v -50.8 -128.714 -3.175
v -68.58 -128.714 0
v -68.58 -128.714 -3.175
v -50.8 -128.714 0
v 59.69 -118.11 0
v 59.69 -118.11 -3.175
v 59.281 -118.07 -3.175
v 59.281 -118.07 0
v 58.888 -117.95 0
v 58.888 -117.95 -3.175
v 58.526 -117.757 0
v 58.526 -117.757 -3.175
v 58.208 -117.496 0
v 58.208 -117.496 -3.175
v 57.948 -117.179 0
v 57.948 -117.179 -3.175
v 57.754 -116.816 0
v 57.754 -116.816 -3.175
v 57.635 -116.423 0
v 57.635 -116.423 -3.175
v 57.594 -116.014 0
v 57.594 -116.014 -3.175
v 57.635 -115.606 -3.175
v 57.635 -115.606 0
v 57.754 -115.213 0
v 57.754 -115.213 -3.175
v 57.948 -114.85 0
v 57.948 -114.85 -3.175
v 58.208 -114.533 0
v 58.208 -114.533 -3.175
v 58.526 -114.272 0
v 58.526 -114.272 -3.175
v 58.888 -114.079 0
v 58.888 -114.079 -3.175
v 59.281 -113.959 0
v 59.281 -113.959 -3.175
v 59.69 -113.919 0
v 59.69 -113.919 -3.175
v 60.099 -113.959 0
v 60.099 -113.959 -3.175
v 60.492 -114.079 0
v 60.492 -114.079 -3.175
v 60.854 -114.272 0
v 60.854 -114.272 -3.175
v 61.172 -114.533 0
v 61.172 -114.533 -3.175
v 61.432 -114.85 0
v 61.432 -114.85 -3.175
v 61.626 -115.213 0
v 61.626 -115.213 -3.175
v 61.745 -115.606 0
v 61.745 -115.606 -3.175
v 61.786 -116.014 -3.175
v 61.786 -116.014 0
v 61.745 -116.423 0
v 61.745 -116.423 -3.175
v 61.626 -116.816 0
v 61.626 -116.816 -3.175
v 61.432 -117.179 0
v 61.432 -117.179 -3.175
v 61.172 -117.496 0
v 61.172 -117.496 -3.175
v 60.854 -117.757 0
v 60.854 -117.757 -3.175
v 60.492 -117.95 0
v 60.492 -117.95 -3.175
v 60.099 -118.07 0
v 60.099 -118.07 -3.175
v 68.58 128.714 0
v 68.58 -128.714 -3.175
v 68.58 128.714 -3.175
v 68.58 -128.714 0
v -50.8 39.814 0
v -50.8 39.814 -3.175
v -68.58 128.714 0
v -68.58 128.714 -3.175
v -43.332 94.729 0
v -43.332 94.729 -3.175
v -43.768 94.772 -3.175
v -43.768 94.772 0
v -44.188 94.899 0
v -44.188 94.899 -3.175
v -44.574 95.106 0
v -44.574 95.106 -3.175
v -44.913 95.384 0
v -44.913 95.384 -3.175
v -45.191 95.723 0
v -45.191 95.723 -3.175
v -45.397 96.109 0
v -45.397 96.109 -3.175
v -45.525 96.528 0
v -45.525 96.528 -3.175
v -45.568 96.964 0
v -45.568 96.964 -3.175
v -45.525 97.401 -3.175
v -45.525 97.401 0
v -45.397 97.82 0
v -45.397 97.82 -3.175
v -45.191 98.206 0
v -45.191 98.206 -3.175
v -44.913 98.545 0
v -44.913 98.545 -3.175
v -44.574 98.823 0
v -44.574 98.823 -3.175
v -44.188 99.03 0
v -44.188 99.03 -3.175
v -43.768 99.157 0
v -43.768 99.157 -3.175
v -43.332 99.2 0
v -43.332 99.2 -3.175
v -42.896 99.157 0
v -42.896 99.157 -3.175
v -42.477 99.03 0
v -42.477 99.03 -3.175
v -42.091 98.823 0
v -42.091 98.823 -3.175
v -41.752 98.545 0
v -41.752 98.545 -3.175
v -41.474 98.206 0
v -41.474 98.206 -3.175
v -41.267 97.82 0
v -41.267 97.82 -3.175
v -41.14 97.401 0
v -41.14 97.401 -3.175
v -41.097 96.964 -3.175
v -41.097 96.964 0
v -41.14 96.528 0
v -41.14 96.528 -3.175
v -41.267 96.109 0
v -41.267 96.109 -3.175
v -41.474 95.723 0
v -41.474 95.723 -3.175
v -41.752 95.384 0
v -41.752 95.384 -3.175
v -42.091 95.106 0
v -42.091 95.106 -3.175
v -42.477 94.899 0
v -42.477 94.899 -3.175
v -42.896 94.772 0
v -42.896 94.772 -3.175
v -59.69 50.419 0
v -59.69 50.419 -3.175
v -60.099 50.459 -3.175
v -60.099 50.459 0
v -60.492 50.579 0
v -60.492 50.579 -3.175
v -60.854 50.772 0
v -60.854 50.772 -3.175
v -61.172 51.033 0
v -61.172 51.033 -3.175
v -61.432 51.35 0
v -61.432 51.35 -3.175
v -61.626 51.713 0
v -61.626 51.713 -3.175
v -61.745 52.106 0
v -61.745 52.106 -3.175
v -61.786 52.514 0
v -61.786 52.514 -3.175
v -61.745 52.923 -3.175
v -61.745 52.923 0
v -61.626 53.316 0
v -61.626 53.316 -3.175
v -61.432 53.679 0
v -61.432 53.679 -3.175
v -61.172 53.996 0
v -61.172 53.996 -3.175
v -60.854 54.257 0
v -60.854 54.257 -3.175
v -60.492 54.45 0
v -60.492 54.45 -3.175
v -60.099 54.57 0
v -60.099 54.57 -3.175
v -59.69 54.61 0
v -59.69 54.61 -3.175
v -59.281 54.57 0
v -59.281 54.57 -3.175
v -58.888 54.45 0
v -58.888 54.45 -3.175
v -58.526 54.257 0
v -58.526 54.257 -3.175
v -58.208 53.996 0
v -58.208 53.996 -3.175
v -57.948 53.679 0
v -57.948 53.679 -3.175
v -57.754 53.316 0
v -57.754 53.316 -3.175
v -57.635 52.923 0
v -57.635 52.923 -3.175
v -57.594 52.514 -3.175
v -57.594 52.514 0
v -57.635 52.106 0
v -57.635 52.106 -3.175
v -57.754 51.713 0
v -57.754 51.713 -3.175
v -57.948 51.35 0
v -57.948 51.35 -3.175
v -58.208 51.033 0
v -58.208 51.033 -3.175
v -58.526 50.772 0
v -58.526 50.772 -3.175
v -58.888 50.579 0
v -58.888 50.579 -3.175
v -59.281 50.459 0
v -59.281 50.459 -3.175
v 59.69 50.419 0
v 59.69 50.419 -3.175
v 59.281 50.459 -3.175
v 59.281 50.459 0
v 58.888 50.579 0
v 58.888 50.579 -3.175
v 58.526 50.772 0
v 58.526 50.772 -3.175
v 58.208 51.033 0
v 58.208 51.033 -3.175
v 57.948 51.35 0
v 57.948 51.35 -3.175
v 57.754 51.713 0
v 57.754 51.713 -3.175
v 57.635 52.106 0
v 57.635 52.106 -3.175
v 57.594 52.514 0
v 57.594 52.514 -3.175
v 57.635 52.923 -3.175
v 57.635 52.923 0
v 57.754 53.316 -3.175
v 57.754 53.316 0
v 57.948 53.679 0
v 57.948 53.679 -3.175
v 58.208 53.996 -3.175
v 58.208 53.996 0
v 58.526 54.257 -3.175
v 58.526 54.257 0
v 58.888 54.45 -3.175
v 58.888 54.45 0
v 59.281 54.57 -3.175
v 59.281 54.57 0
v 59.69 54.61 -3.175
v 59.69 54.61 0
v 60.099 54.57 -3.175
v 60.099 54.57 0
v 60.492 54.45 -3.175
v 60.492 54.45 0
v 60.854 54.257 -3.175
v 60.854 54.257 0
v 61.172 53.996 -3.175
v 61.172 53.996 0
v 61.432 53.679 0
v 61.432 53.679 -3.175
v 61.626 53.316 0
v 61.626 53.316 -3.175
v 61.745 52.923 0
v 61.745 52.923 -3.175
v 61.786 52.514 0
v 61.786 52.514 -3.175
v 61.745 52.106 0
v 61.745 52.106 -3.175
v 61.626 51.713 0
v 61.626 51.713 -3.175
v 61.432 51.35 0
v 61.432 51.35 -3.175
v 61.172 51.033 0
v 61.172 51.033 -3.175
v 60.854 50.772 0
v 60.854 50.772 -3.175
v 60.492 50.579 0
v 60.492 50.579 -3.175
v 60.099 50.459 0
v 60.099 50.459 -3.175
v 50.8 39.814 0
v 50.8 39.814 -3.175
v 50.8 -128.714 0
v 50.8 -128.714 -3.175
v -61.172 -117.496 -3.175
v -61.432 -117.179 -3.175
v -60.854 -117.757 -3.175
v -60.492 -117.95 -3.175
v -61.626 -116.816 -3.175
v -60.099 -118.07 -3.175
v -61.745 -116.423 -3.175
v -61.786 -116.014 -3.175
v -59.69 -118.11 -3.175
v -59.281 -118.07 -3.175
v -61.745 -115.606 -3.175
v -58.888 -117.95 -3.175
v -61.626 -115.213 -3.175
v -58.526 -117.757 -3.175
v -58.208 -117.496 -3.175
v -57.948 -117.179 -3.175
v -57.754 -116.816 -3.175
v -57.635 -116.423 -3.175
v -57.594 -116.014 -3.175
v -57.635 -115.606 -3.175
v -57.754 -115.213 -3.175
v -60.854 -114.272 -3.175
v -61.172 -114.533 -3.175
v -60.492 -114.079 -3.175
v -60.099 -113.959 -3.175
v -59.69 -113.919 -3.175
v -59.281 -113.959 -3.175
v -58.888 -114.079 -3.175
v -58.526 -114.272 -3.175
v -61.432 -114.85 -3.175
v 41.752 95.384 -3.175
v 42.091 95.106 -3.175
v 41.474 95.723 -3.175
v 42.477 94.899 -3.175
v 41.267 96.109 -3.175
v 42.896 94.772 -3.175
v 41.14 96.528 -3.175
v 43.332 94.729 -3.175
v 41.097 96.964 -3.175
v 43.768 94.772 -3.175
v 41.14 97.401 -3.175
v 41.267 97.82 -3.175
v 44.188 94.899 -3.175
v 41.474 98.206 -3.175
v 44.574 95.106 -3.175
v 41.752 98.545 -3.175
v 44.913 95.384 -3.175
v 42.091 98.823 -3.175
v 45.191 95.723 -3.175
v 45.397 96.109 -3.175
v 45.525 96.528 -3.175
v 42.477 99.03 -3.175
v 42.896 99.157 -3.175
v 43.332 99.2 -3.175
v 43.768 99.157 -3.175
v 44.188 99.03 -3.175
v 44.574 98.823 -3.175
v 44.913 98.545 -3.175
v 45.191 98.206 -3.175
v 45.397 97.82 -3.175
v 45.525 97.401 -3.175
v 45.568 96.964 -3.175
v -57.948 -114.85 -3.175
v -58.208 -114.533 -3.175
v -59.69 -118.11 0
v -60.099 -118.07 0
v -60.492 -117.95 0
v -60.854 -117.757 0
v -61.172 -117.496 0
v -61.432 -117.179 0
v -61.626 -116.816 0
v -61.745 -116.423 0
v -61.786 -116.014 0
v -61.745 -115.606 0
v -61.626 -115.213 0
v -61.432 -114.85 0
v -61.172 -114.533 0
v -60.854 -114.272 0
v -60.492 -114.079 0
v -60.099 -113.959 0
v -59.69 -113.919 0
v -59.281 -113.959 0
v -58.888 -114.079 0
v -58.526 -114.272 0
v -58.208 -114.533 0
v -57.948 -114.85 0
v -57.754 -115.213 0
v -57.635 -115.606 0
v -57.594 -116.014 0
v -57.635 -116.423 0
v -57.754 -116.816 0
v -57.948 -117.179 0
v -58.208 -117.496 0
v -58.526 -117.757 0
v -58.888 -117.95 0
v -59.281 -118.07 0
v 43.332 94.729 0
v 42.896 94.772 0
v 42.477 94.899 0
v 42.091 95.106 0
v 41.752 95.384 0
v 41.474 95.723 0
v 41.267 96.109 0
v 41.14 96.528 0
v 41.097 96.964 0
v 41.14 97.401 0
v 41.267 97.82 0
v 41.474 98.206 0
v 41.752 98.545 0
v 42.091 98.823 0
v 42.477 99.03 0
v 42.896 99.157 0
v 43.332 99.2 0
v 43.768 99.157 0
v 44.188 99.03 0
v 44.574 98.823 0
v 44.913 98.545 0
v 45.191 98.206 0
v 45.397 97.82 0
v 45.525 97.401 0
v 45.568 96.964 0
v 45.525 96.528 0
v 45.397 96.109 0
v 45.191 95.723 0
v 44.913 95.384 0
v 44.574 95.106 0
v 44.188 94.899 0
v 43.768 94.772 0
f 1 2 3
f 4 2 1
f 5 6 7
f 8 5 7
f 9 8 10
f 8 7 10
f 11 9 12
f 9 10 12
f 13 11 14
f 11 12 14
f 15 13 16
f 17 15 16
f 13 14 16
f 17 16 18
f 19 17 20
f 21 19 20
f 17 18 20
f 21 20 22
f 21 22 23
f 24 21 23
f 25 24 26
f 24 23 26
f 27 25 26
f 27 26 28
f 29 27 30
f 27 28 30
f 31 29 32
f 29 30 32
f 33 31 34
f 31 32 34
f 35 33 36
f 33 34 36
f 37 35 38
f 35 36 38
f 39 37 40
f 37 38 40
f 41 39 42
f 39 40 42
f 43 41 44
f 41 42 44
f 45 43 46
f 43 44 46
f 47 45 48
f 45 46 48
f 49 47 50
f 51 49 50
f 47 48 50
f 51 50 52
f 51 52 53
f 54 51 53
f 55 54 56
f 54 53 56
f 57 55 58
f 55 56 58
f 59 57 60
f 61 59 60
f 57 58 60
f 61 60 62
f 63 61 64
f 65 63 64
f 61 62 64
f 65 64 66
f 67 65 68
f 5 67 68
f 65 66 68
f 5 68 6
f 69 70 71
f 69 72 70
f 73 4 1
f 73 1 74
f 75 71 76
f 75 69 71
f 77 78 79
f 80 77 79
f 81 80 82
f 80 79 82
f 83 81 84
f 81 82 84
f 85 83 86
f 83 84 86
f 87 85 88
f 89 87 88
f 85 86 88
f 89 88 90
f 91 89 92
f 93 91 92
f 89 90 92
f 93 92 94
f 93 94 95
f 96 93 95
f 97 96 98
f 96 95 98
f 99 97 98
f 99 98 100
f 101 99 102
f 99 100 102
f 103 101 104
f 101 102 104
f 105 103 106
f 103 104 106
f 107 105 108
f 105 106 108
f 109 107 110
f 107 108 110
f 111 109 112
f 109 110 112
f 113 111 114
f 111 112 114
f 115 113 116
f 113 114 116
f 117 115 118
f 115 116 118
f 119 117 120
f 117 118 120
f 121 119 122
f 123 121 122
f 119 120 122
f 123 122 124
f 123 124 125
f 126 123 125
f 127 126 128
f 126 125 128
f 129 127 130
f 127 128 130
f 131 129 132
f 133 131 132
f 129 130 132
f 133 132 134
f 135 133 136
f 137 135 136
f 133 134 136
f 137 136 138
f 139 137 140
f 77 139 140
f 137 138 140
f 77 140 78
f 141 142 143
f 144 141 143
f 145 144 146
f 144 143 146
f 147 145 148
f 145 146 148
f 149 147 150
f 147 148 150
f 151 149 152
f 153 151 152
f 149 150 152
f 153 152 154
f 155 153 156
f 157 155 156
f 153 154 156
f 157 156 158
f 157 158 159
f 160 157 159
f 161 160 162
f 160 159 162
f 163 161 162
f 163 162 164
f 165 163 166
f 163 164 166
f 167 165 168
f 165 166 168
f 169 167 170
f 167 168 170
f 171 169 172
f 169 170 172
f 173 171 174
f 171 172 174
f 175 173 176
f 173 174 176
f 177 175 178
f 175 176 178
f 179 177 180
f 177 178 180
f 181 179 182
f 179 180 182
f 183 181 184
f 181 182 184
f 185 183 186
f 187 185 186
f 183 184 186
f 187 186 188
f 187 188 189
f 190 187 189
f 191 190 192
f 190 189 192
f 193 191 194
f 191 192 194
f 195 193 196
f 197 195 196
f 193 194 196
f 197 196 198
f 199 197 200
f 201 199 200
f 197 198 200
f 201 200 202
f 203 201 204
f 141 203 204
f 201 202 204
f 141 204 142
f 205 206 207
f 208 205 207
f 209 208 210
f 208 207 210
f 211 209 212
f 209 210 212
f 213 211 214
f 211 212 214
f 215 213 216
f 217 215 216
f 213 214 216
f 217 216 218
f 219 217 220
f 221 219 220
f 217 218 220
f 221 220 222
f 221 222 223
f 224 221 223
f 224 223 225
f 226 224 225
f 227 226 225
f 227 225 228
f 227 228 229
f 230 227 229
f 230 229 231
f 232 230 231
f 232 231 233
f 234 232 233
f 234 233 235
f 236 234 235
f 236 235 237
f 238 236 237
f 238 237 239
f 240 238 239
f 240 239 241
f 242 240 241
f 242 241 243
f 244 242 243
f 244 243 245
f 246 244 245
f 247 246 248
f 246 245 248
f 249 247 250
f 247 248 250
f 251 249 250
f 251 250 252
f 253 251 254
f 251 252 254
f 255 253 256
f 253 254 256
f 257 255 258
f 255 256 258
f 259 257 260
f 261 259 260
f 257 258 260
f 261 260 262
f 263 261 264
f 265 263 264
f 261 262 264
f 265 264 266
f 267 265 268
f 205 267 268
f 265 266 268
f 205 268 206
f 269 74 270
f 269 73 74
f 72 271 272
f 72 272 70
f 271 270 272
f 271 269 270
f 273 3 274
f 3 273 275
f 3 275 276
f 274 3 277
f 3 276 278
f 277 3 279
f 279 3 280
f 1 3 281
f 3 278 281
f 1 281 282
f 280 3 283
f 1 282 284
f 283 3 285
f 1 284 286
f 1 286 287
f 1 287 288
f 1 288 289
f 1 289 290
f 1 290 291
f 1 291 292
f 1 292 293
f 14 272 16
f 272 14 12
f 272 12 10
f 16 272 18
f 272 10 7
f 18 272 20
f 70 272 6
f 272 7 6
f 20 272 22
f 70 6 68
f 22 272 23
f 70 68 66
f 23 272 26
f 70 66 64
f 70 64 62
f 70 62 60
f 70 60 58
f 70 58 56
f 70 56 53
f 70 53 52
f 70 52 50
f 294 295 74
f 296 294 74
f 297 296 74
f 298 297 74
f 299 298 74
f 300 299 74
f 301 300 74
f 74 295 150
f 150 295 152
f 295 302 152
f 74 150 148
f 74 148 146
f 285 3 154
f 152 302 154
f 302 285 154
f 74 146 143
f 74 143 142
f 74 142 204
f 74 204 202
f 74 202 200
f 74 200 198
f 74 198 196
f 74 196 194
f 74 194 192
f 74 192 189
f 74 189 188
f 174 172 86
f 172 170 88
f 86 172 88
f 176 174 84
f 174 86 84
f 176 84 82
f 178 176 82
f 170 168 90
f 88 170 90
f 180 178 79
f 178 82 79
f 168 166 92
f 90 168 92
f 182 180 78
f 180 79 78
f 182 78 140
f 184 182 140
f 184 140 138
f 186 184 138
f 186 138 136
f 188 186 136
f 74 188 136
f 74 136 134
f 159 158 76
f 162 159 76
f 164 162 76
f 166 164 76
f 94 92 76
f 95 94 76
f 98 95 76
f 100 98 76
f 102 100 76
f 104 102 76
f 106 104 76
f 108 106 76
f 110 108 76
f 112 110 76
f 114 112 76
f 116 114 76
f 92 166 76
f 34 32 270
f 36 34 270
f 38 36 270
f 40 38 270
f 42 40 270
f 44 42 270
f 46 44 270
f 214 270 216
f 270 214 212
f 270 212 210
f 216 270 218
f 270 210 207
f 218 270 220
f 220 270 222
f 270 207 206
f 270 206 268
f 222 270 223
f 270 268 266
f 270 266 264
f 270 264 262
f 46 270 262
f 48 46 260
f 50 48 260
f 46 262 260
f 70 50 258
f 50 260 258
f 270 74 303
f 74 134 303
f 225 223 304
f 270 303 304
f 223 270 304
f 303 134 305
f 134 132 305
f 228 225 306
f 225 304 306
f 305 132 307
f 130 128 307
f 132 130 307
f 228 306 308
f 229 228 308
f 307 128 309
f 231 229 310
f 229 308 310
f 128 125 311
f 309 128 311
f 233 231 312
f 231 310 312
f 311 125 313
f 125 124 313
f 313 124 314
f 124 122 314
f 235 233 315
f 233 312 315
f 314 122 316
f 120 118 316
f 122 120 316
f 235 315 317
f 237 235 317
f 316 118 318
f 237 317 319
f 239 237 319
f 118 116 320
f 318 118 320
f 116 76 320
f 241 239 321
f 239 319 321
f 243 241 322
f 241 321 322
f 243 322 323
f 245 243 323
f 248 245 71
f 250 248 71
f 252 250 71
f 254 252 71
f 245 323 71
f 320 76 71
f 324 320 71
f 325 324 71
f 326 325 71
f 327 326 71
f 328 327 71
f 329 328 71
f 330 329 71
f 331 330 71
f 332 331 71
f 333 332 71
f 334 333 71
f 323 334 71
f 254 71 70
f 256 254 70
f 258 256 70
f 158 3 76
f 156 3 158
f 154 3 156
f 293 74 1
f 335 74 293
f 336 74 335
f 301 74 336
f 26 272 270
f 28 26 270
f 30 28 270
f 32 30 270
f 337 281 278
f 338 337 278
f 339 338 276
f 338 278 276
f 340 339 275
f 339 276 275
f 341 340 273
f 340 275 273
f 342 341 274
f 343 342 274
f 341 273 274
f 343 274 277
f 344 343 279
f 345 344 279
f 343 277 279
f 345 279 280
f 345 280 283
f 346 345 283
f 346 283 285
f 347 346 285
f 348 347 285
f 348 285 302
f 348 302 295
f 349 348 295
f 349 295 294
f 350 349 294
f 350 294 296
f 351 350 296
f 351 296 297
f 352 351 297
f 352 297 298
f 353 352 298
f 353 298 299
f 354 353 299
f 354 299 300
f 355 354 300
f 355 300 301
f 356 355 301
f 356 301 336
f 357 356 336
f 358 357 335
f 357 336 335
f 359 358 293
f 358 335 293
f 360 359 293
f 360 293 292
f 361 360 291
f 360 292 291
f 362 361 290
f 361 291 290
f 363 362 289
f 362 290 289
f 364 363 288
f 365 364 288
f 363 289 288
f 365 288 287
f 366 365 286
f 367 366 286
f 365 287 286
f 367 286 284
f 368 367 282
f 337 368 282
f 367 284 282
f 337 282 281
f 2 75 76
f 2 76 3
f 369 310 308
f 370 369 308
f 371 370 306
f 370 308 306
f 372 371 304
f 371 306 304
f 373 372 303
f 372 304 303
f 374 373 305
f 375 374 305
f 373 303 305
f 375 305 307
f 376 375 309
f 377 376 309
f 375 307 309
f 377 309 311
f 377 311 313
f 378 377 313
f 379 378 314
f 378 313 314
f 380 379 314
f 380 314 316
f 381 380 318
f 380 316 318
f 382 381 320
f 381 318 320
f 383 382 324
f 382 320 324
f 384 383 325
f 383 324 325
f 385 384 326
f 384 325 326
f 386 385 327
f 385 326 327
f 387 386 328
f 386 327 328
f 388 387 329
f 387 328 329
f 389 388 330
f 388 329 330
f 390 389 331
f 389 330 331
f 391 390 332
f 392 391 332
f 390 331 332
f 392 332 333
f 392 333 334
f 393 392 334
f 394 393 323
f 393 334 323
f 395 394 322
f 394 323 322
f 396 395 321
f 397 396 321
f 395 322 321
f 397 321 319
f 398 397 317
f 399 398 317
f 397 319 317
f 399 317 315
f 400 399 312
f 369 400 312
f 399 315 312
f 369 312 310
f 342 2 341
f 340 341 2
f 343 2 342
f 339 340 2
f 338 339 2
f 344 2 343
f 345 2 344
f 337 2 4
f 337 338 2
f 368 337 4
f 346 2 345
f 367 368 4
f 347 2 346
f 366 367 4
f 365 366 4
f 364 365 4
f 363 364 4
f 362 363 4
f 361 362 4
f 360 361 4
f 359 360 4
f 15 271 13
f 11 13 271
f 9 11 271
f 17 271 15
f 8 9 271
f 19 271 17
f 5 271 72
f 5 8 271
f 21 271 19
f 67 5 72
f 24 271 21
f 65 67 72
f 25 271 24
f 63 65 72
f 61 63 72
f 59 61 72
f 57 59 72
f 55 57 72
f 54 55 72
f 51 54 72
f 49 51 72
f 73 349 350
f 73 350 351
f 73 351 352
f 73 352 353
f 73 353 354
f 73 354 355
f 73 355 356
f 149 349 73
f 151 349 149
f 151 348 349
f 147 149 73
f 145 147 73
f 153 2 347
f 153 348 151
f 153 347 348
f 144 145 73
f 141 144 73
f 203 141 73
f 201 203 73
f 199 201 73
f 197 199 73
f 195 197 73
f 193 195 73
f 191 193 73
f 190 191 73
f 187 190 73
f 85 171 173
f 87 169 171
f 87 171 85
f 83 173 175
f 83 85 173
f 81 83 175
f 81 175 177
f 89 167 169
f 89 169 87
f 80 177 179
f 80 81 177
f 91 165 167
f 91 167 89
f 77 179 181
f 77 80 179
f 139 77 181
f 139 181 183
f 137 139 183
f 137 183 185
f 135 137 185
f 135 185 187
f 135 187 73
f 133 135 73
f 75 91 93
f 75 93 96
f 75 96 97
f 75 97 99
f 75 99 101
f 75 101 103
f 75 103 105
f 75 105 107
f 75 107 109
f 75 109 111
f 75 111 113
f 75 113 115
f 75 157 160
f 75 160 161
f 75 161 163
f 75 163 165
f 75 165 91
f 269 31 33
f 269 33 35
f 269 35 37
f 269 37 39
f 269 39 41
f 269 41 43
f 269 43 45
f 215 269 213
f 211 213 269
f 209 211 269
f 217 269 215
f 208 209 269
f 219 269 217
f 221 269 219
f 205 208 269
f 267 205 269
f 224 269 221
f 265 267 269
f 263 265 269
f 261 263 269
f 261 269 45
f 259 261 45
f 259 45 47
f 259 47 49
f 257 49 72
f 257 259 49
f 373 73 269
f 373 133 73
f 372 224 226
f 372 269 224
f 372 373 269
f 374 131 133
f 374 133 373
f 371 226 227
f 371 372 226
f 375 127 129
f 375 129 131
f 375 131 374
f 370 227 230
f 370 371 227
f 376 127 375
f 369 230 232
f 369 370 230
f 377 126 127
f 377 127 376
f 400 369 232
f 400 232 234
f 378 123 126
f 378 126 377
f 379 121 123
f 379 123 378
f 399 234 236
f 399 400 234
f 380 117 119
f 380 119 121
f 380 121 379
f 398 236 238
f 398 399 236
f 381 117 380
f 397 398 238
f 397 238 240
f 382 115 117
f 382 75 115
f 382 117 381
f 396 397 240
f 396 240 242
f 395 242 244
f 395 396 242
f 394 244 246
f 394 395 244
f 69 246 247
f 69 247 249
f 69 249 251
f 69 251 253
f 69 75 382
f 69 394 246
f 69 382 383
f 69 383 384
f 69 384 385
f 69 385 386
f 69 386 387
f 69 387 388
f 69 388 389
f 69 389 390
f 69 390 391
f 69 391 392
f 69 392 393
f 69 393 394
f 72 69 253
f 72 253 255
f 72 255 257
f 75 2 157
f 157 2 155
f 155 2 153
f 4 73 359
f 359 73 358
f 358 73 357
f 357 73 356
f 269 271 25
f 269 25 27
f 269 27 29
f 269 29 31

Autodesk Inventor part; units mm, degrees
ref_plane "YZ Plane" through (0, 0, 0) normal (1, 0, 0) x (0, 1, 0)
ref_plane "XZ Plane" through (0, 0, 0) normal (0, 1, 0) x (-1, 0, 0)
ref_plane "XY Plane" through (0, 0, 0) normal (0, 0, 1) x (1, 0, 0)
sketch "Sketch1" plane through (0, 0, 0) normal (0, 0, 1) x (1, 0, 0)
  line L0 (-68.58, -128.7145) -> (68.58, -128.7145)
  line L1 (68.58, -128.7145) -> (68.58, 128.7145)
  line L2 (68.58, 128.7145) -> (-68.58, 128.7145)
  line L3 (-68.58, 128.7145) -> (-68.58, -128.7145)
  line L4 (-68.58, -128.7145) -> (68.58, 128.7145) construction
  line L5 (68.58, -128.7145) -> (-68.58, 128.7145) construction
  point P0 (0, 0)
  dimension "d0" = 137.16
  dimension "d1" = 257.429
extrude "Extrusion1" add sketch "Sketch1" against normal blind 3.175
sketch "Sketch2" plane through (0, 0, 0) normal (0, 0, 1) x (1, 0, 0)
  circle A0 centre (-59.69, 52.5145) radius 2.0955
  line L0 (-68.58, 128.7145) -> (-68.58, -128.7145) projected
  line L1 (-68.58, 128.7145) -> (68.58, 128.7145) projected
  circle A1 centre (59.69, 52.5145) radius 2.0955
  line L2 (68.58, -128.7145) -> (68.58, 128.7145) projected
  circle A2 centre (-59.69, -116.0145) radius 2.0955
  circle A3 centre (59.69, -116.0145) radius 2.0955
  line L3 (-68.58, -128.7145) -> (68.58, -128.7145) projected
  point P0 (0, 0)
  dimension "d4" = 8.89
  dimension "d5" = 76.2
  dimension "d6" = 76.2
  dimension "d7" = 8.89
  dimension "d8" = 4.191
  dimension "d9" = 12.7
  dimension "d10" = 8.89
  dimension "d11" = 8.89
  dimension "d12" = 12.7
  dimension "d13" = 4.191
  dimension "d21" = 4.191
  dimension "d22" = 4.191
hole "Hole1" at (-59.69, 52.5145, 0) at (59.69, 52.5145, 0) at (-59.69, -116.0145, 0) at (59.69, -116.0145, 0) direction (0, 0, -1) diameter 4.191 end through all
sketch "Sketch4" plane through (0, 0, 0) normal (0, 0, 1) x (1, 0, 0)
  line L0 (-35.179, -49.0855) -> (-35.179, -99.8855)
  line L1 (-28.321, -49.0855) -> (-28.321, -99.8855)
  line L2 (28.321, -49.0855) -> (28.321, -99.8855)
  line L3 (35.179, -49.0855) -> (35.179, -99.8855)
  line L4 (-68.58, 128.7145) -> (-68.58, -128.7145) projected
  line L5 (68.58, -128.7145) -> (68.58, 128.7145) projected
  line L6 (-68.58, -128.7145) -> (68.58, -128.7145) projected
  arc A0 (-28.321, -49.0855) -> (-35.179, -49.0855) centre (-31.75, -49.0855) ccw
  arc A1 (-35.179, -99.8855) -> (-28.321, -99.8855) centre (-31.75, -99.8855) ccw
  arc A2 (35.179, -49.0855) -> (28.321, -49.0855) centre (31.75, -49.0855) ccw
  arc A3 (28.321, -99.8855) -> (35.179, -99.8855) centre (31.75, -99.8855) ccw
  point P0 (0, 0)
  dimension "d23" = 6.858
  dimension "d24" = 6.858
  dimension "d25" = 33.401
  dimension "d26" = 50.8
  dimension "d27" = 33.401
  dimension "d28" = 28.829
  dimension "d29" = 28.829
  dimension "d30" = 28.829
  dimension "d31" = 28.829
  dimension "d32" = 50.8
  dimension "d33" = 50.8
  dimension "d34" = 50.8
extrude "Extrusion2" cut sketch "Sketch4" against normal blind 3.175
sketch "Sketch5" plane through (0, 0, 0) normal (0, 0, 1) x (1, 0, 0)
  line L0 (-68.58, 128.7145) -> (68.58, 128.7145) projected
  line L1 (68.58, 128.7145) -> (68.58, -128.7145) projected
  point P0 (0, 0)
  point P1 (-43.3324, 96.9645)
  point P2 (43.3324, 96.9645)
  dimension "d37" = 31.75
  dimension "d38" = 86.6648
  dimension "d39" = 31.75
  dimension "d40" = 25.2476
hole "Hole2" at (-43.3324, 96.9645, 0) at (43.3324, 96.9645, 0) direction (0, 0, -1) diameter 4.4704 end through all
sketch "battery_buzzer" plane through (0, 0, 0) normal (0, 0, 1) x (1, 0, 0)
  point P0 (0, 0)
sketch "Sketch10" plane through (0, 0, 0) normal (0, 0, 1) x (1, 0, 0)
  line L0 (-50.8, -128.7145) -> (-50.8, 39.8145)
  line L1 (-50.8, 39.8145) -> (50.8, 39.8145)
  line L2 (50.8, 39.8145) -> (50.8, -128.7145)
  line L3 (68.58, 128.7145) -> (-68.58, 128.7145) projected
  line L4 (-68.58, 128.7145) -> (-68.58, -128.7145) projected
  line L5 (68.58, 128.7145) -> (68.58, -128.7145) projected
  line L6 (-50.8, -128.7145) -> (50.8, -128.7145)
  point P0 (0, 0)
  dimension "d48" = 88.9
  dimension "d49" = 17.78
  dimension "d50" = 17.78
extrude "Extrusion3" cut sketch "Sketch10" against normal blind 3.175
